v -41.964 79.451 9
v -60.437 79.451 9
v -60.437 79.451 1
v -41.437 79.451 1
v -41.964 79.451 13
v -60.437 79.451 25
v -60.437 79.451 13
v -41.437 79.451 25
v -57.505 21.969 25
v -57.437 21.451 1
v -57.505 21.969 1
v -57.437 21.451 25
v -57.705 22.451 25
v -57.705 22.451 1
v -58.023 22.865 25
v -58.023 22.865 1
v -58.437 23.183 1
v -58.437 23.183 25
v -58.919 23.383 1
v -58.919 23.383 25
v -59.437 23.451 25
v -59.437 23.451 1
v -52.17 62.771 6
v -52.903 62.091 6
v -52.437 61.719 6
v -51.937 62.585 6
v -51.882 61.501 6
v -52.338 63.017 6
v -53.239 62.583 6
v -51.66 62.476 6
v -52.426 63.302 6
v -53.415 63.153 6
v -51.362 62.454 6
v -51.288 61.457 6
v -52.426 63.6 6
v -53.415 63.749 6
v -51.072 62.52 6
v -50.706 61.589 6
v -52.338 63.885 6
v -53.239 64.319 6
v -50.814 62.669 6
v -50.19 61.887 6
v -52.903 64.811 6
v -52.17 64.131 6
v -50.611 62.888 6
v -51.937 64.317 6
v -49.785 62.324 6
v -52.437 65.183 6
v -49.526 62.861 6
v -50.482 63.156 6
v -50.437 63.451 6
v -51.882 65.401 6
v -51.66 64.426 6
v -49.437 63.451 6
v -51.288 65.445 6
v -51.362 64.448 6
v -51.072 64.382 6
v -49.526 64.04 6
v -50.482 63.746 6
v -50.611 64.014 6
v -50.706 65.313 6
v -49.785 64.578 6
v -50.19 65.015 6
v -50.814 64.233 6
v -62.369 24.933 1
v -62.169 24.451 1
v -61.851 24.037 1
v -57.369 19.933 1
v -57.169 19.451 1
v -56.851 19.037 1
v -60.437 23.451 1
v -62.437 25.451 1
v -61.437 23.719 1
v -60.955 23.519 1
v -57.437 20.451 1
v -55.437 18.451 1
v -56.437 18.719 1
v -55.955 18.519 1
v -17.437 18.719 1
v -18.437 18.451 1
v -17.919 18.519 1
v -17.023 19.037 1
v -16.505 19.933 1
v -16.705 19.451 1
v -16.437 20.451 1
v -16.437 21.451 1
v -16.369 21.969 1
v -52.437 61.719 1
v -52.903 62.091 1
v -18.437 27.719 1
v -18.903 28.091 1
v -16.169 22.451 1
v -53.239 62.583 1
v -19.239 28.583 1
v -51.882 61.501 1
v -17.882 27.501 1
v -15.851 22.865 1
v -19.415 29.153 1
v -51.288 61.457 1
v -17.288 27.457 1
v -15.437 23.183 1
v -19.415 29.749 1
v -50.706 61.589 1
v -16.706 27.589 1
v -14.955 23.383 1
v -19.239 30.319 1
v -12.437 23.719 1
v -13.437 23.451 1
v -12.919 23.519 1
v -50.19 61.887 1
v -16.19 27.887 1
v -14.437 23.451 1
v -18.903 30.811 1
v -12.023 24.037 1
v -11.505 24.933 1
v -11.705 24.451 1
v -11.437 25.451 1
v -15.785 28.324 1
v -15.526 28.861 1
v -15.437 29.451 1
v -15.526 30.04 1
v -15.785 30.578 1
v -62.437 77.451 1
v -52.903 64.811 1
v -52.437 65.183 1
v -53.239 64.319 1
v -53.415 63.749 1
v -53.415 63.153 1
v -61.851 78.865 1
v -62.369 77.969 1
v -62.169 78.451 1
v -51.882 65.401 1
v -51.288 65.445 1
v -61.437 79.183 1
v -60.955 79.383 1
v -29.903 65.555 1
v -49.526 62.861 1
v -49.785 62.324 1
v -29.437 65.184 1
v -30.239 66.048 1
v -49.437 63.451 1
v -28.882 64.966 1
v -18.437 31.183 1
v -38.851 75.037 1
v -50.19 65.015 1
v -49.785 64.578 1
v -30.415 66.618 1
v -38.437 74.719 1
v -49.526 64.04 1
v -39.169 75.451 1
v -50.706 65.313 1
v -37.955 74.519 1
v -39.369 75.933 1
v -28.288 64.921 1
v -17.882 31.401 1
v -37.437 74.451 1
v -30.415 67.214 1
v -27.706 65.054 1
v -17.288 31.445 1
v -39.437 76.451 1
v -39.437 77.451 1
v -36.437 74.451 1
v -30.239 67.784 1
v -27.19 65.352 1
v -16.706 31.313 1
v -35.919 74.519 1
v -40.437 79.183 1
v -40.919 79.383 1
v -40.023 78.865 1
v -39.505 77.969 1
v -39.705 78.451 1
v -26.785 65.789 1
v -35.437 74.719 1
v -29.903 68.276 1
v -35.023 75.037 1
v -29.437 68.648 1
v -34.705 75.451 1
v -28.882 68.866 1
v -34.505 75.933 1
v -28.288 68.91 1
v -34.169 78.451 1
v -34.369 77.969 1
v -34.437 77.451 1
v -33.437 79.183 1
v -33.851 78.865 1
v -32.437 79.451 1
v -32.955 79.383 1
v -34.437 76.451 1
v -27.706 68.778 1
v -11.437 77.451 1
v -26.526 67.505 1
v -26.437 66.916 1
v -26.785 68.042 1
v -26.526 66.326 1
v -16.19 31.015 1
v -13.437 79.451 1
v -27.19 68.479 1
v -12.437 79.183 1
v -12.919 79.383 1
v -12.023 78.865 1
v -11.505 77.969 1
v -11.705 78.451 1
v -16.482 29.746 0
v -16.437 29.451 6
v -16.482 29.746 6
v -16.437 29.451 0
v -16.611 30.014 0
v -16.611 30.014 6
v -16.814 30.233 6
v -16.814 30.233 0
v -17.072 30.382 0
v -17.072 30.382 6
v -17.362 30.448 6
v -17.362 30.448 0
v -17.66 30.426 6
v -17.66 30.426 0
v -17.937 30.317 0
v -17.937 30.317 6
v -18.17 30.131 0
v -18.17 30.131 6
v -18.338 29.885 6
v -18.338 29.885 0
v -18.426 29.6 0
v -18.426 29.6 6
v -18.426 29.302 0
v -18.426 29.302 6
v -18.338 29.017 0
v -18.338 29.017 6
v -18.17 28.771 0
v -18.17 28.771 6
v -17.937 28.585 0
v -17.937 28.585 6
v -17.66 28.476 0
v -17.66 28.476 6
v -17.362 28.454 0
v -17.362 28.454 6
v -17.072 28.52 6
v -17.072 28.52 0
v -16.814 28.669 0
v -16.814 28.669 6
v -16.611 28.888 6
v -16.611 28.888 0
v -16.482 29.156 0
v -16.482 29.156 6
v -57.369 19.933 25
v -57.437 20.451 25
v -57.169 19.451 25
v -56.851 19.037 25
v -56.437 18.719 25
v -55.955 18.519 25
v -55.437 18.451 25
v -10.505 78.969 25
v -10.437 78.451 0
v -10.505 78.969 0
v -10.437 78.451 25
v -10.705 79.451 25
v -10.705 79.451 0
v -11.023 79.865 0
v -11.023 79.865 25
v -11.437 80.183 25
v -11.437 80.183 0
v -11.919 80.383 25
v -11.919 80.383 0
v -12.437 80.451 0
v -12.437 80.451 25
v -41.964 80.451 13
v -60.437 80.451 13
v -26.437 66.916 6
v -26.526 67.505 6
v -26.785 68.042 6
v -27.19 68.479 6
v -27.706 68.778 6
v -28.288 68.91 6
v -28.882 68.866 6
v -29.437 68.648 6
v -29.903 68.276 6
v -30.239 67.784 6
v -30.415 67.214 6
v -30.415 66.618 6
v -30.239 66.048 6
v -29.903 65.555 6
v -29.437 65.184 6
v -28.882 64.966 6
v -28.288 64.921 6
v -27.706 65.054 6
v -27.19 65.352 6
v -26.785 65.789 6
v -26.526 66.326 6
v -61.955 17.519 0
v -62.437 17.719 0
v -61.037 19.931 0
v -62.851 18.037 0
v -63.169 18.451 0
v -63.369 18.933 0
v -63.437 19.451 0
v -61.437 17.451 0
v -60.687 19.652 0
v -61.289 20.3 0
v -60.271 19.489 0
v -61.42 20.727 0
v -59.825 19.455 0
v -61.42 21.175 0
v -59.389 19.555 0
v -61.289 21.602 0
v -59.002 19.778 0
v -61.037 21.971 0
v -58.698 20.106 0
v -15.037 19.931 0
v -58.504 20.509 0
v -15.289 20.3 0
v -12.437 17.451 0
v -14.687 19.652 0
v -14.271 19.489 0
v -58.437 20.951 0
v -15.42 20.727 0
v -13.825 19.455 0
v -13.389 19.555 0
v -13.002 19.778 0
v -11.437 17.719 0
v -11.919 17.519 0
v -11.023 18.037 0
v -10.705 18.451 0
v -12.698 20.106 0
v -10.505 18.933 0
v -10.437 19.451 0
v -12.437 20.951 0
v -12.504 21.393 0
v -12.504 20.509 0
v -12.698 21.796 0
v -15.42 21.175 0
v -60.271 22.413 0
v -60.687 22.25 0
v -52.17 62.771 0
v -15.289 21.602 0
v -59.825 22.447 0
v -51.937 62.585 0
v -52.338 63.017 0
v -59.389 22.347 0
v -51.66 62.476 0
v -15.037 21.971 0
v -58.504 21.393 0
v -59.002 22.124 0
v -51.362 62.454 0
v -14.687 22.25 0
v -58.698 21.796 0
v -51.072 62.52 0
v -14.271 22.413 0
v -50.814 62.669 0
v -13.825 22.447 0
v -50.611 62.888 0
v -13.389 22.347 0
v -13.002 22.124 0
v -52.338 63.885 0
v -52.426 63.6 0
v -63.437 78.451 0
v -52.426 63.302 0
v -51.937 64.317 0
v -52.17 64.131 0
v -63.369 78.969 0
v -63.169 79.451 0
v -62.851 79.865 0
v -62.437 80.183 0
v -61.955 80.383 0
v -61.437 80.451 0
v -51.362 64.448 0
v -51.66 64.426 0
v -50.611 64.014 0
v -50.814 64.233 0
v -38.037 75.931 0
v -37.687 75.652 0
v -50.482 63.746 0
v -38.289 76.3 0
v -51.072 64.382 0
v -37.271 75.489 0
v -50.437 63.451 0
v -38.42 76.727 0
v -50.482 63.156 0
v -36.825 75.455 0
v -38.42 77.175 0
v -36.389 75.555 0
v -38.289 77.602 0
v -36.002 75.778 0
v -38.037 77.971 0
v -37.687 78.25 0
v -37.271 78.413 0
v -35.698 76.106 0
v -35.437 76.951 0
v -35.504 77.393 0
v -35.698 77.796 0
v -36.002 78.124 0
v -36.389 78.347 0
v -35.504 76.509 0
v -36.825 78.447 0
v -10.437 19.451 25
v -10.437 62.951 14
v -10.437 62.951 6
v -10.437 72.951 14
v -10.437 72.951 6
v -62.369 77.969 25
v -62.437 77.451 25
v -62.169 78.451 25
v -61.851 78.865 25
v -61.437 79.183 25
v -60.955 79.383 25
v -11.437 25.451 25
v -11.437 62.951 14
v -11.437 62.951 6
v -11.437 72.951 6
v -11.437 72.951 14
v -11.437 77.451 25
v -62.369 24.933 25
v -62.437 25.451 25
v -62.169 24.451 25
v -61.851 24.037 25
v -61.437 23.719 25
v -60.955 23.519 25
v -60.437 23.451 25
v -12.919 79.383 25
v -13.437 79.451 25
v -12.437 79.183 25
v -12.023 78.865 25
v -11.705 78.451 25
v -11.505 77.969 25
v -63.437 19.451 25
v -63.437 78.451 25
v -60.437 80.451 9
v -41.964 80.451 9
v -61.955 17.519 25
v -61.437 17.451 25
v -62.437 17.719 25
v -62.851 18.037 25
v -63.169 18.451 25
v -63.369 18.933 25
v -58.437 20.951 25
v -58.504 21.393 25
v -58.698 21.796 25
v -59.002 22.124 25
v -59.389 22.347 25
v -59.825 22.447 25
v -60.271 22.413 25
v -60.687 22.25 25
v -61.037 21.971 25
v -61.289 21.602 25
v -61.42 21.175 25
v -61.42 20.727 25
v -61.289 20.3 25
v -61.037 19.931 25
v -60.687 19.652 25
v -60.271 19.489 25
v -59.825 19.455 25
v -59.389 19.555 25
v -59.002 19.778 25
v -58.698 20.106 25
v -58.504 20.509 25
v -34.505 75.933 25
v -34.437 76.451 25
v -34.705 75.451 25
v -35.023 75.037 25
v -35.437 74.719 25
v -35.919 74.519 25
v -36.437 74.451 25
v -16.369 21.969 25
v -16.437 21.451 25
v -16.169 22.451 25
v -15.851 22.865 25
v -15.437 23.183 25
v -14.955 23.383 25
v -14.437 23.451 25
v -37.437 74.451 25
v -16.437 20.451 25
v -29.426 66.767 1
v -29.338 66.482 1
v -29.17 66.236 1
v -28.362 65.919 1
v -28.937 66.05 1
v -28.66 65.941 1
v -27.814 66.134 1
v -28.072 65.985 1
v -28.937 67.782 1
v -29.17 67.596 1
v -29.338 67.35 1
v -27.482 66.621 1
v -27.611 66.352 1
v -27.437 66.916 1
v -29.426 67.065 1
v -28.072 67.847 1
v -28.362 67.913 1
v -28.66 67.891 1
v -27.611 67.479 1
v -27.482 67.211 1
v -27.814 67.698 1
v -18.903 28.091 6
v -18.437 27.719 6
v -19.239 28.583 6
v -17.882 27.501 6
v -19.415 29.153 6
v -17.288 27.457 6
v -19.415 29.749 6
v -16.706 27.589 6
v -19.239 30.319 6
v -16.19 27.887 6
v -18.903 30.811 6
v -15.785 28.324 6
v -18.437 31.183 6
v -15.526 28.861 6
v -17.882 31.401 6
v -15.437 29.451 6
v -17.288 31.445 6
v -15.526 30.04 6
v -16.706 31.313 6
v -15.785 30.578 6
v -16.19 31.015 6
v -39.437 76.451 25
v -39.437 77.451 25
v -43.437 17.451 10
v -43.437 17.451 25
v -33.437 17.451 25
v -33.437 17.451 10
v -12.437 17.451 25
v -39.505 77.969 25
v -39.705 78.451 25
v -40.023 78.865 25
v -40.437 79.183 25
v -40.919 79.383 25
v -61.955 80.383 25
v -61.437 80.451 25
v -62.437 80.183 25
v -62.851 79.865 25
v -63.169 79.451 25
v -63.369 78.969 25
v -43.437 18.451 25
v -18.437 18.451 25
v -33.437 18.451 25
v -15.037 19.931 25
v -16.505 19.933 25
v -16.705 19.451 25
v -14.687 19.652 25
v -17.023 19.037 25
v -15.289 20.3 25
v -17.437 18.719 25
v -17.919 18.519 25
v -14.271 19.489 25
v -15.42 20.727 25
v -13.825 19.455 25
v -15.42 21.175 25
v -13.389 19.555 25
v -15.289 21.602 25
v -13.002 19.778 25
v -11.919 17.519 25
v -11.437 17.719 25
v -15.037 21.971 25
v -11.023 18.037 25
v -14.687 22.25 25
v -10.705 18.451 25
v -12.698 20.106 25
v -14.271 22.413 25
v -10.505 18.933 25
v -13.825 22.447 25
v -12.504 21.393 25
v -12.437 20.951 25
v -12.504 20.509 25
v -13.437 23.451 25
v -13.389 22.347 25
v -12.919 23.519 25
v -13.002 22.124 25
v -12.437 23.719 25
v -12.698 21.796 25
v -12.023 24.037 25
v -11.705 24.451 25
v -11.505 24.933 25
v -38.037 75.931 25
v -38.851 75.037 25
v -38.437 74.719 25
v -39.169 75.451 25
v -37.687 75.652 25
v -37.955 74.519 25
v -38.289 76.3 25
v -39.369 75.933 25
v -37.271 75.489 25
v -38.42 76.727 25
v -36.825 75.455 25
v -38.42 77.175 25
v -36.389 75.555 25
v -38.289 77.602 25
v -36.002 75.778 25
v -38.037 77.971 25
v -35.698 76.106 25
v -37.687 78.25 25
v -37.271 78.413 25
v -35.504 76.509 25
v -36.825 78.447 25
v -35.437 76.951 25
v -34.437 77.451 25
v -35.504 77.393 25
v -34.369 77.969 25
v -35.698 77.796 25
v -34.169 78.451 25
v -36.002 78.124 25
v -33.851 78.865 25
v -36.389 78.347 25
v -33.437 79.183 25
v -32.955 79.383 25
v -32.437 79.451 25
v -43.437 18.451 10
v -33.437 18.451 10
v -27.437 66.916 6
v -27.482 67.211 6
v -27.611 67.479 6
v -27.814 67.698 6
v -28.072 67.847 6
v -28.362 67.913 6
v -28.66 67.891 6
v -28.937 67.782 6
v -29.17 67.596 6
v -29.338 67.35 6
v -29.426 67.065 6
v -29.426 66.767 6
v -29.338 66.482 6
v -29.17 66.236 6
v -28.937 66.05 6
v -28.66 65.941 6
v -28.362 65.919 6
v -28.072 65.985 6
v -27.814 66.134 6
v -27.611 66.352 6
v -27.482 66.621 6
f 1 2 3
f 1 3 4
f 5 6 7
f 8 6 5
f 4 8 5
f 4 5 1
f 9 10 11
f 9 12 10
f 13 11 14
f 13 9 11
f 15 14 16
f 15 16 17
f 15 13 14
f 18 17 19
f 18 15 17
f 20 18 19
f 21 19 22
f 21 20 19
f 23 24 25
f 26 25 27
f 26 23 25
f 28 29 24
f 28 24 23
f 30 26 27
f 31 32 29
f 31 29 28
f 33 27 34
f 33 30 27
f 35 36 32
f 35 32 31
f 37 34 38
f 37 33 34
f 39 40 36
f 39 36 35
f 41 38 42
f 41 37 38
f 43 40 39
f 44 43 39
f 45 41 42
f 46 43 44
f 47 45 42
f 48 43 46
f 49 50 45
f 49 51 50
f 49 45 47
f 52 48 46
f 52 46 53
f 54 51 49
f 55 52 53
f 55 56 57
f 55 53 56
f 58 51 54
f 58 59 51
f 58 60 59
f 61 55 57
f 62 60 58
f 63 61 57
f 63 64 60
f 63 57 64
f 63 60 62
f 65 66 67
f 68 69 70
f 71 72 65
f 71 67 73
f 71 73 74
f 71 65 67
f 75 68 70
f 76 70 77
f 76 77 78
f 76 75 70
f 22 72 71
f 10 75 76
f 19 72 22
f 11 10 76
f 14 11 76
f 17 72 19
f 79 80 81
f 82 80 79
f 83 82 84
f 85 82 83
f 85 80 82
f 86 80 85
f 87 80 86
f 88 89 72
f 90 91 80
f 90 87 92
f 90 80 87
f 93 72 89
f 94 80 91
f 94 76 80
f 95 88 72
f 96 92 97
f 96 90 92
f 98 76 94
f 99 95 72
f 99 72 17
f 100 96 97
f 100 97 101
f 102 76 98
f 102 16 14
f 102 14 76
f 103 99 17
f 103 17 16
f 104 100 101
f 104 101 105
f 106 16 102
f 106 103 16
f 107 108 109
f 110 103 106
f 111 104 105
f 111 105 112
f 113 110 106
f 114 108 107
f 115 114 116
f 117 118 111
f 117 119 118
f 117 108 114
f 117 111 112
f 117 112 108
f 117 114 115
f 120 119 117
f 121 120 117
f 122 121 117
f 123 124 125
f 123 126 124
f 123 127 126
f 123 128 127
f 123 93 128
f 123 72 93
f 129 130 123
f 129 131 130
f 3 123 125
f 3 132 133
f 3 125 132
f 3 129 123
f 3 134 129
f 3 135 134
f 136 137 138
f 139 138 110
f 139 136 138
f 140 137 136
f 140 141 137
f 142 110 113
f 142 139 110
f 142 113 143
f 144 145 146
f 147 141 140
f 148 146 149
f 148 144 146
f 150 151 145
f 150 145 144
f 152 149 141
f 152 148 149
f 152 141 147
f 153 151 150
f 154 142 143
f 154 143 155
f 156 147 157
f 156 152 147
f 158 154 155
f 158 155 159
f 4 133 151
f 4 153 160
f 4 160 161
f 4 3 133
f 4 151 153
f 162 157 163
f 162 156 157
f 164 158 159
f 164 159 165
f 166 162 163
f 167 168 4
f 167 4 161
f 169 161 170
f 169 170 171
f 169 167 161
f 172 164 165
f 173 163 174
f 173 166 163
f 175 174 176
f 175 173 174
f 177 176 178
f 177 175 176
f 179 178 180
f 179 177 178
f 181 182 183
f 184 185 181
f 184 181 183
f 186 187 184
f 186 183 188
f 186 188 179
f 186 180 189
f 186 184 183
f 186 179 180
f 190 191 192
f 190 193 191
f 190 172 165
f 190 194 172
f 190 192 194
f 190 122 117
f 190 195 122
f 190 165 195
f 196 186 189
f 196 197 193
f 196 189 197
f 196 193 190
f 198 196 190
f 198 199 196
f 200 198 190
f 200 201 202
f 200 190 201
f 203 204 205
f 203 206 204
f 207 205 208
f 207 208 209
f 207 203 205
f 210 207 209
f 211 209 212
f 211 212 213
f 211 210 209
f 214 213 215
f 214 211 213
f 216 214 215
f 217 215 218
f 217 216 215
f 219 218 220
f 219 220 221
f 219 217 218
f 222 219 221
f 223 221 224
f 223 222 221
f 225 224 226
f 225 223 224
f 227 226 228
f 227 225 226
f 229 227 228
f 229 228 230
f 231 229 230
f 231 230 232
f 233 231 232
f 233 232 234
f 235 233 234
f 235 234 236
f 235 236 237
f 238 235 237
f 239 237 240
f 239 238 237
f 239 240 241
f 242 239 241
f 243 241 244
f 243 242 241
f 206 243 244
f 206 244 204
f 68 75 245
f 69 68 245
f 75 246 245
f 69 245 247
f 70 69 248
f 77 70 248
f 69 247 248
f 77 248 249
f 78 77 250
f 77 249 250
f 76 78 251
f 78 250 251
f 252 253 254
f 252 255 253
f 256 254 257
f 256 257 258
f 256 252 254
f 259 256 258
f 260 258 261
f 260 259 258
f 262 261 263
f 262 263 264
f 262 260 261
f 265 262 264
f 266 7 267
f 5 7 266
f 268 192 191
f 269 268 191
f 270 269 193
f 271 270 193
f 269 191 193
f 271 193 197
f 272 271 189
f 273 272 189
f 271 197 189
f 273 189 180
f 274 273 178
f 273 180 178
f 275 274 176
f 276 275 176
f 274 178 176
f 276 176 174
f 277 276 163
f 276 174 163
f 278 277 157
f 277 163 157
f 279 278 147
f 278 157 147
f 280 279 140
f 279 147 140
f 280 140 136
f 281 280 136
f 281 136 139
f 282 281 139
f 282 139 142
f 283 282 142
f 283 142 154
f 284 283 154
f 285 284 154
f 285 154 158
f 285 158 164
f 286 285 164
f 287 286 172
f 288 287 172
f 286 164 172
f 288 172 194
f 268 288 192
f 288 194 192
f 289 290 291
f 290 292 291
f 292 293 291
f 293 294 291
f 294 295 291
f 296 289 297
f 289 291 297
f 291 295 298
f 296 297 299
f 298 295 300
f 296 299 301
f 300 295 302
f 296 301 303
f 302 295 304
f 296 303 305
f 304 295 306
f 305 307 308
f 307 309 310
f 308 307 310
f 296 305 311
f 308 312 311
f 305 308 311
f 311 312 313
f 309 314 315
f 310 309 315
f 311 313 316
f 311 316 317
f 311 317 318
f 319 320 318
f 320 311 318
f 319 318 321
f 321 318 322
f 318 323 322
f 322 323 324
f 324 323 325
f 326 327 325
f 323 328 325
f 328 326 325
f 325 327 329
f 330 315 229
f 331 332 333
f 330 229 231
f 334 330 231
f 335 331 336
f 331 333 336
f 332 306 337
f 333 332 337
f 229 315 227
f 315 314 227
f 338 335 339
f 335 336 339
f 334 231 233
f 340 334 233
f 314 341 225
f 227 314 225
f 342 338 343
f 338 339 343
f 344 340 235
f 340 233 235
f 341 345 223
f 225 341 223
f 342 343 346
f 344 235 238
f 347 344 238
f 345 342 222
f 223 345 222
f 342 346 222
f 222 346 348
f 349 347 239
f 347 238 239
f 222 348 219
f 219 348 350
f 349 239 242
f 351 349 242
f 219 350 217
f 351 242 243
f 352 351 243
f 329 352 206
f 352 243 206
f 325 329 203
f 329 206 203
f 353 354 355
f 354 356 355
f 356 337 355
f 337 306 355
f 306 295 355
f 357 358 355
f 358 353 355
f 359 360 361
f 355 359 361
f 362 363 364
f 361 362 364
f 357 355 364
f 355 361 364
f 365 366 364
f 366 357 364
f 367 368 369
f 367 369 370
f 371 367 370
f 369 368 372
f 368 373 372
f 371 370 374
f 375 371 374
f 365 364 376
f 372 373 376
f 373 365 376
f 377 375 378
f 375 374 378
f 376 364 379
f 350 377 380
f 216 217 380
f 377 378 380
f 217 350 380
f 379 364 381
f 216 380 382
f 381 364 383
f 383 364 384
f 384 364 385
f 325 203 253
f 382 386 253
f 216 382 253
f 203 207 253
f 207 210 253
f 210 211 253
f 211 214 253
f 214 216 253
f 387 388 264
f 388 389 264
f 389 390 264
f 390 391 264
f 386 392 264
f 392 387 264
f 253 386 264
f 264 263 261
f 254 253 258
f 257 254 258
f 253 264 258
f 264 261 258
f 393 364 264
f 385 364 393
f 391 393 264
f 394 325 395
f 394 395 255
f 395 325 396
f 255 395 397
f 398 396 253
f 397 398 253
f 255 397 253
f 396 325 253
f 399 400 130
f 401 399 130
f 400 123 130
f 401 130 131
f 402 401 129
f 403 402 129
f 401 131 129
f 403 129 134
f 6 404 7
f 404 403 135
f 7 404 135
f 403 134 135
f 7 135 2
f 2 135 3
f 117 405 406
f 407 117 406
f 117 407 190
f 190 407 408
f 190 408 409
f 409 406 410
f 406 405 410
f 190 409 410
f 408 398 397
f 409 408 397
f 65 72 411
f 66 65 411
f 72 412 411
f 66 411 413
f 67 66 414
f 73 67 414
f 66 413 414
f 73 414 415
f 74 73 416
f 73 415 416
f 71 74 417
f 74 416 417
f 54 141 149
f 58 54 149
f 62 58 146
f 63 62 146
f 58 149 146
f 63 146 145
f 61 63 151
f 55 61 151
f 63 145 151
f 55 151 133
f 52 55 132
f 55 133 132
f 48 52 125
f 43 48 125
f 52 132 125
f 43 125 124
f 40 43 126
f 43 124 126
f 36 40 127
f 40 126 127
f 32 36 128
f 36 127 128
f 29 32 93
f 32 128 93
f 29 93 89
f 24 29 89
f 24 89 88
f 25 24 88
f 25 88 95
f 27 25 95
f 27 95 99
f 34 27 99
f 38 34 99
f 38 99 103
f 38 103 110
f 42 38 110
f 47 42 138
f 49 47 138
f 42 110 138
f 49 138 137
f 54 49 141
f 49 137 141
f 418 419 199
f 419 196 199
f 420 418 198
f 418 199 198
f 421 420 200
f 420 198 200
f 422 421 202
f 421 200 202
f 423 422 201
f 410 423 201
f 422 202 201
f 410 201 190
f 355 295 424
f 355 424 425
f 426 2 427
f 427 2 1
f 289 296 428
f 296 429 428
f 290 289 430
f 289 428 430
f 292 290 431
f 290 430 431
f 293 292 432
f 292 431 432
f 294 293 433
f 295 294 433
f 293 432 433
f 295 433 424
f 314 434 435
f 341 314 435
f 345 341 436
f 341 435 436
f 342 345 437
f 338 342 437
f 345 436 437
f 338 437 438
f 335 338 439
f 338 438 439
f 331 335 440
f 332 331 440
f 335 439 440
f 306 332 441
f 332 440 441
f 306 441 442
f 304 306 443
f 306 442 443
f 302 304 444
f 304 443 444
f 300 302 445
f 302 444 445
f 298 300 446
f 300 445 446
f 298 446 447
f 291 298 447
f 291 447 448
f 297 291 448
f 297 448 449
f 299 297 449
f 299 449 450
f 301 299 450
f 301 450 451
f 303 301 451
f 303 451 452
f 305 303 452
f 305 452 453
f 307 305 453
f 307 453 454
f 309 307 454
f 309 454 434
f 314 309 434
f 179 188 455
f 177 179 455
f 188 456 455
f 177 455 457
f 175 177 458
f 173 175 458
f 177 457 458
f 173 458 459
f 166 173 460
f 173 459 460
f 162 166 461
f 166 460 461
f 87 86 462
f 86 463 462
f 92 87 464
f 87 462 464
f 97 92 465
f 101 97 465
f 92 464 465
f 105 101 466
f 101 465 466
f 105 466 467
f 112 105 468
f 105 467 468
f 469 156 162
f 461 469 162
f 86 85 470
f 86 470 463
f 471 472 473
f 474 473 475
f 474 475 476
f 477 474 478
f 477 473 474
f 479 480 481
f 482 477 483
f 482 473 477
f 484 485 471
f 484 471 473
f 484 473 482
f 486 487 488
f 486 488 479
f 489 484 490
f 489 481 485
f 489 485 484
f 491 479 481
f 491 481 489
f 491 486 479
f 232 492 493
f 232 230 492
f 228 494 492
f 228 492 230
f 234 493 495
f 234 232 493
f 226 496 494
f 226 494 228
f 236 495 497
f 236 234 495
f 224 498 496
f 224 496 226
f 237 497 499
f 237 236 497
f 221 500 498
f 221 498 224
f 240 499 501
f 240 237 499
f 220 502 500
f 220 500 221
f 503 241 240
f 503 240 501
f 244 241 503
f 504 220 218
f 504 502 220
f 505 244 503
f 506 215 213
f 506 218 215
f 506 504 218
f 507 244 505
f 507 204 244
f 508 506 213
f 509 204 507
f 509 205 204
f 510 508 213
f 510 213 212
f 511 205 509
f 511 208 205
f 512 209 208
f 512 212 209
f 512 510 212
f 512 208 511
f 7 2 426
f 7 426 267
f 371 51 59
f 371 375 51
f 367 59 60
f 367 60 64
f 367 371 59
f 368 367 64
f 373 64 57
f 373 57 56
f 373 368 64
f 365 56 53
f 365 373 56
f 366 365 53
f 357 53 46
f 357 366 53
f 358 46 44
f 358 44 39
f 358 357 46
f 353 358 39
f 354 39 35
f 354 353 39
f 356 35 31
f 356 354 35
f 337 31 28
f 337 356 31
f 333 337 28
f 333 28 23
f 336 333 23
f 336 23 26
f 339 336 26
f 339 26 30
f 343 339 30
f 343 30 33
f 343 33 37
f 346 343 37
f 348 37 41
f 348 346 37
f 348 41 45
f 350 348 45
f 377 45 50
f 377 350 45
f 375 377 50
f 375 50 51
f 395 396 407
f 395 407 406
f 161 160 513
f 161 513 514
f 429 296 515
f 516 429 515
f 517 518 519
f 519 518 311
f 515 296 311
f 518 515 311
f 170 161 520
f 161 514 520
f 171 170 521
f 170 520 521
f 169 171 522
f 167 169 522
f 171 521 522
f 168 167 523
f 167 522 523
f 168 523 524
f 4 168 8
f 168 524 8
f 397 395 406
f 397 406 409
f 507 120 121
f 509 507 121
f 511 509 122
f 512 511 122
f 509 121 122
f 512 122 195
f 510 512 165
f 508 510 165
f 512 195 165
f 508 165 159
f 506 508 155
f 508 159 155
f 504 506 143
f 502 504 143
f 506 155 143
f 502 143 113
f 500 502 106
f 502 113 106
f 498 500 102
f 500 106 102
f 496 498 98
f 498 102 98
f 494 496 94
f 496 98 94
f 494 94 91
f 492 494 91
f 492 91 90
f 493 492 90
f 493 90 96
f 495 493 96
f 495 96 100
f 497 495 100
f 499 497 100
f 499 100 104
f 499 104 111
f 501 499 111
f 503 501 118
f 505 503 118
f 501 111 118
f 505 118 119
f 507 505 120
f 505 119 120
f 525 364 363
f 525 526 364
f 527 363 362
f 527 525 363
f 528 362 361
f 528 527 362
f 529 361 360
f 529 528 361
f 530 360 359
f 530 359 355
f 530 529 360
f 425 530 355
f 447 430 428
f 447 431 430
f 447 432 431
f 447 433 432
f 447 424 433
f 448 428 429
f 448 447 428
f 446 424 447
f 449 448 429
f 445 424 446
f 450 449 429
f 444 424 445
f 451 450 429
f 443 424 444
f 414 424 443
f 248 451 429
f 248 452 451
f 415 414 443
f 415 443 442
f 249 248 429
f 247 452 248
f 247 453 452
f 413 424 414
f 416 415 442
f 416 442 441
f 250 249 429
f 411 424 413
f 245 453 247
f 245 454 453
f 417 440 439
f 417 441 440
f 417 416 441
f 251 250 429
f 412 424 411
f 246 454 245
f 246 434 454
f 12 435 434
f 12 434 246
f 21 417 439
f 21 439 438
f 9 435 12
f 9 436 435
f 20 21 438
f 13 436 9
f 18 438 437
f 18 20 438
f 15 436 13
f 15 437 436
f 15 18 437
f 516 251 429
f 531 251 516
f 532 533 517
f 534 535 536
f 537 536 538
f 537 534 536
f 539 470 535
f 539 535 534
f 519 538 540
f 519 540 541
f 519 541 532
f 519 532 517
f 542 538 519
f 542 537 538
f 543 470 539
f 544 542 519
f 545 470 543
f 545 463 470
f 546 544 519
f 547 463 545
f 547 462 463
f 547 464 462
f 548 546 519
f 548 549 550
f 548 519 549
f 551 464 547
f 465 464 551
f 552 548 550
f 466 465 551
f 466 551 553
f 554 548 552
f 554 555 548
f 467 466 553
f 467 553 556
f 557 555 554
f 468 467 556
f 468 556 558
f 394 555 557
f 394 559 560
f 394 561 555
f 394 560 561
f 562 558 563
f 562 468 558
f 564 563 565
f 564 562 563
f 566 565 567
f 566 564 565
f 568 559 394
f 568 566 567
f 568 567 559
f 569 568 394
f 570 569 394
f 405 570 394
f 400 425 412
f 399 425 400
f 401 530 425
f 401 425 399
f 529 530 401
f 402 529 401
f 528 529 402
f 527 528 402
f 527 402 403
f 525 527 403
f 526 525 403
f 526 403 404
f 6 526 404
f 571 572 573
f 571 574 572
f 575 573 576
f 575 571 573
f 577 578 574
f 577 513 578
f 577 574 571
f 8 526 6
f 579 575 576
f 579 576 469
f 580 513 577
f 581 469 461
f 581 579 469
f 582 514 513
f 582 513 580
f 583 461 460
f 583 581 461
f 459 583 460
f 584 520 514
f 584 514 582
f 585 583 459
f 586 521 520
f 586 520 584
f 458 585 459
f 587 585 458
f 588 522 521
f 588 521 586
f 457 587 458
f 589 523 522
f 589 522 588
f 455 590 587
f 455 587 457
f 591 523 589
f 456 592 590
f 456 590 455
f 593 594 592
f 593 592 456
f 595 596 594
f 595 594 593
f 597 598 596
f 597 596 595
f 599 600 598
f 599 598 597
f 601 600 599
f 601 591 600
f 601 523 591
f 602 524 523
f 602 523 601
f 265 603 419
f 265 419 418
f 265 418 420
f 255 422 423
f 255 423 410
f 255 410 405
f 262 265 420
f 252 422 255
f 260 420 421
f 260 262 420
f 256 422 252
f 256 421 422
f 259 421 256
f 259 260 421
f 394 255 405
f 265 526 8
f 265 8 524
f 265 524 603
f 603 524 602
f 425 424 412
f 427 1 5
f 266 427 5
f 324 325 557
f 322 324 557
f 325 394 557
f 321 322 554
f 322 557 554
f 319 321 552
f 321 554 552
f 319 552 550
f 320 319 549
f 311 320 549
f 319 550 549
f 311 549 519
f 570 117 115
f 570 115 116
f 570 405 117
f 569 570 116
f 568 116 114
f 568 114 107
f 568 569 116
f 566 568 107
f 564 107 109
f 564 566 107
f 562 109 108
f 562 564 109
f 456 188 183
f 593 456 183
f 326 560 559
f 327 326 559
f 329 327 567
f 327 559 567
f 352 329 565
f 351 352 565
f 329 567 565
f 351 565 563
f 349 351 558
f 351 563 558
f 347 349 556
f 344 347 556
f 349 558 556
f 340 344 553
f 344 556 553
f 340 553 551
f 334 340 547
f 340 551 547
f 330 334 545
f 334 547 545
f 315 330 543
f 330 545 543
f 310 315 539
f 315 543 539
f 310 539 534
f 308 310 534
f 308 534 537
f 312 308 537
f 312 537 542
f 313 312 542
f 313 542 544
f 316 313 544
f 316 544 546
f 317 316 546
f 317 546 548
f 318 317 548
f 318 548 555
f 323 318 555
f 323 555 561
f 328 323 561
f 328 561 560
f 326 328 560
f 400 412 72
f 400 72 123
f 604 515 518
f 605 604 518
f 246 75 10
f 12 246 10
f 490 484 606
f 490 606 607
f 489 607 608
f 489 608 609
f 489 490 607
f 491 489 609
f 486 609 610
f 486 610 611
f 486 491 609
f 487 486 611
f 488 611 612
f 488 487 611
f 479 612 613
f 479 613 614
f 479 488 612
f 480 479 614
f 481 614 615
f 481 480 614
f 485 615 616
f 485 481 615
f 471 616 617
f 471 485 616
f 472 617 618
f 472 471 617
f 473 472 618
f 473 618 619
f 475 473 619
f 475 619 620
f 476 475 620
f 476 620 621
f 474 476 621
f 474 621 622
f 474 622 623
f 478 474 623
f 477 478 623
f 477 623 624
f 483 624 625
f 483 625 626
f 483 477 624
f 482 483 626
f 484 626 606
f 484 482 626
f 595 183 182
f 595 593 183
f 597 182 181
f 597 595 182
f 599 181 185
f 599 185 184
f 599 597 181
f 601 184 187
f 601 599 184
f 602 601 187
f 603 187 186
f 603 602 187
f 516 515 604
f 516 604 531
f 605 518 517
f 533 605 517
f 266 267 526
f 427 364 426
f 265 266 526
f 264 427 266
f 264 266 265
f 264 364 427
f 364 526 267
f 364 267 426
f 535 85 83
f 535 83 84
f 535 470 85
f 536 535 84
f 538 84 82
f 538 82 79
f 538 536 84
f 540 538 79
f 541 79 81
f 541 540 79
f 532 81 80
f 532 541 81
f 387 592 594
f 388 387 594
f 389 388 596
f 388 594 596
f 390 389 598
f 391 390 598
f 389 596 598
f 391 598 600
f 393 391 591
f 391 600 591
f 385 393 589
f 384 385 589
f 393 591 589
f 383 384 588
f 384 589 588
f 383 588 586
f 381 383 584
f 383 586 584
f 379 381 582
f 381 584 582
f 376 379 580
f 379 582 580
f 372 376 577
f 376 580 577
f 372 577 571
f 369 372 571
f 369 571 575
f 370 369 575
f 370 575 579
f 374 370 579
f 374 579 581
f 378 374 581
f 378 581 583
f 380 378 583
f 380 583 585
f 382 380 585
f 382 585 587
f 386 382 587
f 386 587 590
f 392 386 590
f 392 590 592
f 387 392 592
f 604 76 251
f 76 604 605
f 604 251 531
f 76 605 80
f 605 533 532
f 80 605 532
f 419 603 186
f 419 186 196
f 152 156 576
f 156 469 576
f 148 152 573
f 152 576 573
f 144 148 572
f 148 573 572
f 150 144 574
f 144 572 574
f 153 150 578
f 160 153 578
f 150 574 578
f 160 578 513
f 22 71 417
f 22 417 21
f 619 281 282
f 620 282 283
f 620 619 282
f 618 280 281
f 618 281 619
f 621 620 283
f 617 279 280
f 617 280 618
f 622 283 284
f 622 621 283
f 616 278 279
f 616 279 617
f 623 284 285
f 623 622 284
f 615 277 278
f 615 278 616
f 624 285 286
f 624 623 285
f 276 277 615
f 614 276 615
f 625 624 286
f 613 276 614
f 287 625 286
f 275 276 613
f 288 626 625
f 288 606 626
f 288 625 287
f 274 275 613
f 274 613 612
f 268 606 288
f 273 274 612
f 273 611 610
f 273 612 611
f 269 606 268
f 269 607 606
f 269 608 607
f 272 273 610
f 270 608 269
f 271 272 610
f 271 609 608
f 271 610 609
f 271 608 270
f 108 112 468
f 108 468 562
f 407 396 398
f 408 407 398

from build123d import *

# Parameters (mm, degrees)
F0_W      = 53
F0_H      = 63
F1_DEPTH  = 25
F2_W      = 51
F2_H      = 61
F3_DEPTH  = 24
F4_W      = 5
F4_H      = 5
F5_DEPTH  = 24
F6_R      = 1.5
F7_DEPTH  = 15
F8_R      = 2
F8_R_2    = 1
F9_DEPTH  = 5
F10_DEPTH = 1
F11_R     = 2
F12_R     = 2
F13_R     = 2
F14_R     = 2
F15_W     = 18.4732184559
F15_H     = 4
F16_DEPTH = 1
F17_W     = 10
F17_H     = 15
F18_DEPTH = 1
F19_W     = 10
F19_H     = 8
F20_DEPTH = 1
F21_DEPTH = 15
F22_R     = 2
F22_R_2   = 1
F23_DEPTH = 5


with BuildPart() as f1:
    # F0 (on Top) → F1 (new body)
    with BuildSketch(Plane.XY):
        with Locations((-36.9371324778, 48.9509678861)):
            Rectangle(F0_W, F0_H)
    extrude(amount=F1_DEPTH)

    # F2 (on face) → F3 (cut)
    with BuildSketch(Plane.XY.offset(25)):
        with Locations((-36.9371324778, 48.9509678861)):
            Rectangle(F2_W, F2_H)
    extrude(amount=-F3_DEPTH, mode=Mode.SUBTRACT)

    # F4 (on face) → F5 (join)
    with BuildSketch(Plane.XY.offset(1)):
        with Locations((-36.9371324778, 76.9509678861)):
            Rectangle(F4_W, F4_H)
        with Locations((-59.9371324778, 20.9509678861)):
            Rectangle(F4_W, F4_H)
        with Locations((-13.9371324778, 20.9509678861)):
            Rectangle(F4_W, F4_H)
    extrude(amount=F5_DEPTH)

    # F6 (on face) → F7 (cut)
    with BuildSketch(Plane.XY.offset(25)):
        with Locations((-36.9371324778, 76.9509678861)):
            Circle(F6_R)
        with Locations((-59.9371324778, 20.9509678861)):
            Circle(F6_R)
        with Locations((-13.9371324778, 20.9509678861)):
            Circle(F6_R)
    extrude(amount=-F7_DEPTH, mode=Mode.SUBTRACT)

    # F8 (on face) → F9 (join)
    with BuildSketch(Plane.XY.offset(1)):
        with Locations((-51.4371324778, 63.4509678861)):
            Circle(F8_R)
        with Locations((-51.4371324778, 63.4509678861)):
            Circle(F8_R_2, mode=Mode.SUBTRACT)
        with Locations((-17.4371324778, 29.4509678861)):
            Circle(F8_R)
        with Locations((-17.4371324778, 29.4509678861)):
            Circle(F8_R_2, mode=Mode.SUBTRACT)
    extrude(amount=F9_DEPTH)

    # F10 (cut): faces of the model
    f10_faces = [f1.faces().sort_by_distance(p)[0] for p in [
        (-51.4371324778, 63.4509678861, 1),
        (-17.4371324778, 29.4509678861, 1),
    ]]
    extrude(f10_faces, amount=-F10_DEPTH, mode=Mode.SUBTRACT)

    # F11
    f11_edges = [f1.edges().sort_by_distance(p)[0] for p in [
        (-63.437132, 80.450968, 12.5),
        (-10.437132, 80.450968, 12.5),
        (-10.437132, 17.450968, 12.5),
        (-63.437132, 17.450968, 12.5),
        (-39.437132, 74.450968, 13),
        (-34.437132, 74.450968, 13),
        (-39.437132, 79.450968, 13),
        (-34.437132, 79.450968, 13),
        (-62.437132, 23.450968, 13),
        (-57.437132, 18.450968, 13),
        (-16.437132, 18.450968, 13),
        (-11.437132, 23.450968, 13),
    ]]
    fillet(f11_edges, radius=F11_R)

    # F12
    f12_edges = [f1.edges().sort_by_distance(p)[0] for p in [
        (-57.437132, 23.450968, 13),
        (-16.437132, 23.450968, 13),
    ]]
    fillet(f12_edges, radius=F12_R)

    # F13
    f13_edges = [f1.edges().sort_by_distance(p)[0] for p in [
        (-62.437132, 79.450968, 13),
    ]]
    fillet(f13_edges, radius=F13_R)

    # F14
    f14_edges = [f1.edges().sort_by_distance(p)[0] for p in [
        (-11.437132, 79.450968, 13),
    ]]
    fillet(f14_edges, radius=F14_R)

    # F15 (on face) → F16 (cut)
    with BuildSketch(Plane.XZ.offset(-79.4509678861)):
        with Locations((-51.2005232498, 11)):
            Rectangle(F15_W, F15_H)
    extrude(amount=-F16_DEPTH, mode=Mode.SUBTRACT)

    # F17 (on face) → F18 (cut)
    with BuildSketch(Plane.XZ.offset(-17.4509678861)):
        with Locations((-38.4371324778, 17.5)):
            Rectangle(F17_W, F17_H)
    extrude(amount=-F18_DEPTH, mode=Mode.SUBTRACT)

    # F19 (on face) → F20 (cut)
    with BuildSketch(Plane.YZ.offset(-10.4371324778)):
        with Locations((67.9509678861, 10)):
            Rectangle(F19_W, F19_H)
    extrude(amount=-F20_DEPTH, mode=Mode.SUBTRACT)

    # F21 (cut): faces of the model
    f21_faces = [f1.faces().sort_by_distance(p)[0] for p in [
        (-59.9371324778, 20.9509678861, 10),
        (-13.9371324778, 20.9509678861, 10),
        (-36.9371324778, 76.9509678861, 10),
    ]]
    extrude(f21_faces, amount=-F21_DEPTH, mode=Mode.SUBTRACT)

    # F22 (on face) → F23 (join)
    with BuildSketch(Plane.XY.offset(1)):
        with Locations((-28.4371324778, 66.9157579541)):
            Circle(F22_R)
        with Locations((-28.4371324778, 66.9157579541)):
            Circle(F22_R_2, mode=Mode.SUBTRACT)
    extrude(amount=F23_DEPTH)


solid = f1.part
